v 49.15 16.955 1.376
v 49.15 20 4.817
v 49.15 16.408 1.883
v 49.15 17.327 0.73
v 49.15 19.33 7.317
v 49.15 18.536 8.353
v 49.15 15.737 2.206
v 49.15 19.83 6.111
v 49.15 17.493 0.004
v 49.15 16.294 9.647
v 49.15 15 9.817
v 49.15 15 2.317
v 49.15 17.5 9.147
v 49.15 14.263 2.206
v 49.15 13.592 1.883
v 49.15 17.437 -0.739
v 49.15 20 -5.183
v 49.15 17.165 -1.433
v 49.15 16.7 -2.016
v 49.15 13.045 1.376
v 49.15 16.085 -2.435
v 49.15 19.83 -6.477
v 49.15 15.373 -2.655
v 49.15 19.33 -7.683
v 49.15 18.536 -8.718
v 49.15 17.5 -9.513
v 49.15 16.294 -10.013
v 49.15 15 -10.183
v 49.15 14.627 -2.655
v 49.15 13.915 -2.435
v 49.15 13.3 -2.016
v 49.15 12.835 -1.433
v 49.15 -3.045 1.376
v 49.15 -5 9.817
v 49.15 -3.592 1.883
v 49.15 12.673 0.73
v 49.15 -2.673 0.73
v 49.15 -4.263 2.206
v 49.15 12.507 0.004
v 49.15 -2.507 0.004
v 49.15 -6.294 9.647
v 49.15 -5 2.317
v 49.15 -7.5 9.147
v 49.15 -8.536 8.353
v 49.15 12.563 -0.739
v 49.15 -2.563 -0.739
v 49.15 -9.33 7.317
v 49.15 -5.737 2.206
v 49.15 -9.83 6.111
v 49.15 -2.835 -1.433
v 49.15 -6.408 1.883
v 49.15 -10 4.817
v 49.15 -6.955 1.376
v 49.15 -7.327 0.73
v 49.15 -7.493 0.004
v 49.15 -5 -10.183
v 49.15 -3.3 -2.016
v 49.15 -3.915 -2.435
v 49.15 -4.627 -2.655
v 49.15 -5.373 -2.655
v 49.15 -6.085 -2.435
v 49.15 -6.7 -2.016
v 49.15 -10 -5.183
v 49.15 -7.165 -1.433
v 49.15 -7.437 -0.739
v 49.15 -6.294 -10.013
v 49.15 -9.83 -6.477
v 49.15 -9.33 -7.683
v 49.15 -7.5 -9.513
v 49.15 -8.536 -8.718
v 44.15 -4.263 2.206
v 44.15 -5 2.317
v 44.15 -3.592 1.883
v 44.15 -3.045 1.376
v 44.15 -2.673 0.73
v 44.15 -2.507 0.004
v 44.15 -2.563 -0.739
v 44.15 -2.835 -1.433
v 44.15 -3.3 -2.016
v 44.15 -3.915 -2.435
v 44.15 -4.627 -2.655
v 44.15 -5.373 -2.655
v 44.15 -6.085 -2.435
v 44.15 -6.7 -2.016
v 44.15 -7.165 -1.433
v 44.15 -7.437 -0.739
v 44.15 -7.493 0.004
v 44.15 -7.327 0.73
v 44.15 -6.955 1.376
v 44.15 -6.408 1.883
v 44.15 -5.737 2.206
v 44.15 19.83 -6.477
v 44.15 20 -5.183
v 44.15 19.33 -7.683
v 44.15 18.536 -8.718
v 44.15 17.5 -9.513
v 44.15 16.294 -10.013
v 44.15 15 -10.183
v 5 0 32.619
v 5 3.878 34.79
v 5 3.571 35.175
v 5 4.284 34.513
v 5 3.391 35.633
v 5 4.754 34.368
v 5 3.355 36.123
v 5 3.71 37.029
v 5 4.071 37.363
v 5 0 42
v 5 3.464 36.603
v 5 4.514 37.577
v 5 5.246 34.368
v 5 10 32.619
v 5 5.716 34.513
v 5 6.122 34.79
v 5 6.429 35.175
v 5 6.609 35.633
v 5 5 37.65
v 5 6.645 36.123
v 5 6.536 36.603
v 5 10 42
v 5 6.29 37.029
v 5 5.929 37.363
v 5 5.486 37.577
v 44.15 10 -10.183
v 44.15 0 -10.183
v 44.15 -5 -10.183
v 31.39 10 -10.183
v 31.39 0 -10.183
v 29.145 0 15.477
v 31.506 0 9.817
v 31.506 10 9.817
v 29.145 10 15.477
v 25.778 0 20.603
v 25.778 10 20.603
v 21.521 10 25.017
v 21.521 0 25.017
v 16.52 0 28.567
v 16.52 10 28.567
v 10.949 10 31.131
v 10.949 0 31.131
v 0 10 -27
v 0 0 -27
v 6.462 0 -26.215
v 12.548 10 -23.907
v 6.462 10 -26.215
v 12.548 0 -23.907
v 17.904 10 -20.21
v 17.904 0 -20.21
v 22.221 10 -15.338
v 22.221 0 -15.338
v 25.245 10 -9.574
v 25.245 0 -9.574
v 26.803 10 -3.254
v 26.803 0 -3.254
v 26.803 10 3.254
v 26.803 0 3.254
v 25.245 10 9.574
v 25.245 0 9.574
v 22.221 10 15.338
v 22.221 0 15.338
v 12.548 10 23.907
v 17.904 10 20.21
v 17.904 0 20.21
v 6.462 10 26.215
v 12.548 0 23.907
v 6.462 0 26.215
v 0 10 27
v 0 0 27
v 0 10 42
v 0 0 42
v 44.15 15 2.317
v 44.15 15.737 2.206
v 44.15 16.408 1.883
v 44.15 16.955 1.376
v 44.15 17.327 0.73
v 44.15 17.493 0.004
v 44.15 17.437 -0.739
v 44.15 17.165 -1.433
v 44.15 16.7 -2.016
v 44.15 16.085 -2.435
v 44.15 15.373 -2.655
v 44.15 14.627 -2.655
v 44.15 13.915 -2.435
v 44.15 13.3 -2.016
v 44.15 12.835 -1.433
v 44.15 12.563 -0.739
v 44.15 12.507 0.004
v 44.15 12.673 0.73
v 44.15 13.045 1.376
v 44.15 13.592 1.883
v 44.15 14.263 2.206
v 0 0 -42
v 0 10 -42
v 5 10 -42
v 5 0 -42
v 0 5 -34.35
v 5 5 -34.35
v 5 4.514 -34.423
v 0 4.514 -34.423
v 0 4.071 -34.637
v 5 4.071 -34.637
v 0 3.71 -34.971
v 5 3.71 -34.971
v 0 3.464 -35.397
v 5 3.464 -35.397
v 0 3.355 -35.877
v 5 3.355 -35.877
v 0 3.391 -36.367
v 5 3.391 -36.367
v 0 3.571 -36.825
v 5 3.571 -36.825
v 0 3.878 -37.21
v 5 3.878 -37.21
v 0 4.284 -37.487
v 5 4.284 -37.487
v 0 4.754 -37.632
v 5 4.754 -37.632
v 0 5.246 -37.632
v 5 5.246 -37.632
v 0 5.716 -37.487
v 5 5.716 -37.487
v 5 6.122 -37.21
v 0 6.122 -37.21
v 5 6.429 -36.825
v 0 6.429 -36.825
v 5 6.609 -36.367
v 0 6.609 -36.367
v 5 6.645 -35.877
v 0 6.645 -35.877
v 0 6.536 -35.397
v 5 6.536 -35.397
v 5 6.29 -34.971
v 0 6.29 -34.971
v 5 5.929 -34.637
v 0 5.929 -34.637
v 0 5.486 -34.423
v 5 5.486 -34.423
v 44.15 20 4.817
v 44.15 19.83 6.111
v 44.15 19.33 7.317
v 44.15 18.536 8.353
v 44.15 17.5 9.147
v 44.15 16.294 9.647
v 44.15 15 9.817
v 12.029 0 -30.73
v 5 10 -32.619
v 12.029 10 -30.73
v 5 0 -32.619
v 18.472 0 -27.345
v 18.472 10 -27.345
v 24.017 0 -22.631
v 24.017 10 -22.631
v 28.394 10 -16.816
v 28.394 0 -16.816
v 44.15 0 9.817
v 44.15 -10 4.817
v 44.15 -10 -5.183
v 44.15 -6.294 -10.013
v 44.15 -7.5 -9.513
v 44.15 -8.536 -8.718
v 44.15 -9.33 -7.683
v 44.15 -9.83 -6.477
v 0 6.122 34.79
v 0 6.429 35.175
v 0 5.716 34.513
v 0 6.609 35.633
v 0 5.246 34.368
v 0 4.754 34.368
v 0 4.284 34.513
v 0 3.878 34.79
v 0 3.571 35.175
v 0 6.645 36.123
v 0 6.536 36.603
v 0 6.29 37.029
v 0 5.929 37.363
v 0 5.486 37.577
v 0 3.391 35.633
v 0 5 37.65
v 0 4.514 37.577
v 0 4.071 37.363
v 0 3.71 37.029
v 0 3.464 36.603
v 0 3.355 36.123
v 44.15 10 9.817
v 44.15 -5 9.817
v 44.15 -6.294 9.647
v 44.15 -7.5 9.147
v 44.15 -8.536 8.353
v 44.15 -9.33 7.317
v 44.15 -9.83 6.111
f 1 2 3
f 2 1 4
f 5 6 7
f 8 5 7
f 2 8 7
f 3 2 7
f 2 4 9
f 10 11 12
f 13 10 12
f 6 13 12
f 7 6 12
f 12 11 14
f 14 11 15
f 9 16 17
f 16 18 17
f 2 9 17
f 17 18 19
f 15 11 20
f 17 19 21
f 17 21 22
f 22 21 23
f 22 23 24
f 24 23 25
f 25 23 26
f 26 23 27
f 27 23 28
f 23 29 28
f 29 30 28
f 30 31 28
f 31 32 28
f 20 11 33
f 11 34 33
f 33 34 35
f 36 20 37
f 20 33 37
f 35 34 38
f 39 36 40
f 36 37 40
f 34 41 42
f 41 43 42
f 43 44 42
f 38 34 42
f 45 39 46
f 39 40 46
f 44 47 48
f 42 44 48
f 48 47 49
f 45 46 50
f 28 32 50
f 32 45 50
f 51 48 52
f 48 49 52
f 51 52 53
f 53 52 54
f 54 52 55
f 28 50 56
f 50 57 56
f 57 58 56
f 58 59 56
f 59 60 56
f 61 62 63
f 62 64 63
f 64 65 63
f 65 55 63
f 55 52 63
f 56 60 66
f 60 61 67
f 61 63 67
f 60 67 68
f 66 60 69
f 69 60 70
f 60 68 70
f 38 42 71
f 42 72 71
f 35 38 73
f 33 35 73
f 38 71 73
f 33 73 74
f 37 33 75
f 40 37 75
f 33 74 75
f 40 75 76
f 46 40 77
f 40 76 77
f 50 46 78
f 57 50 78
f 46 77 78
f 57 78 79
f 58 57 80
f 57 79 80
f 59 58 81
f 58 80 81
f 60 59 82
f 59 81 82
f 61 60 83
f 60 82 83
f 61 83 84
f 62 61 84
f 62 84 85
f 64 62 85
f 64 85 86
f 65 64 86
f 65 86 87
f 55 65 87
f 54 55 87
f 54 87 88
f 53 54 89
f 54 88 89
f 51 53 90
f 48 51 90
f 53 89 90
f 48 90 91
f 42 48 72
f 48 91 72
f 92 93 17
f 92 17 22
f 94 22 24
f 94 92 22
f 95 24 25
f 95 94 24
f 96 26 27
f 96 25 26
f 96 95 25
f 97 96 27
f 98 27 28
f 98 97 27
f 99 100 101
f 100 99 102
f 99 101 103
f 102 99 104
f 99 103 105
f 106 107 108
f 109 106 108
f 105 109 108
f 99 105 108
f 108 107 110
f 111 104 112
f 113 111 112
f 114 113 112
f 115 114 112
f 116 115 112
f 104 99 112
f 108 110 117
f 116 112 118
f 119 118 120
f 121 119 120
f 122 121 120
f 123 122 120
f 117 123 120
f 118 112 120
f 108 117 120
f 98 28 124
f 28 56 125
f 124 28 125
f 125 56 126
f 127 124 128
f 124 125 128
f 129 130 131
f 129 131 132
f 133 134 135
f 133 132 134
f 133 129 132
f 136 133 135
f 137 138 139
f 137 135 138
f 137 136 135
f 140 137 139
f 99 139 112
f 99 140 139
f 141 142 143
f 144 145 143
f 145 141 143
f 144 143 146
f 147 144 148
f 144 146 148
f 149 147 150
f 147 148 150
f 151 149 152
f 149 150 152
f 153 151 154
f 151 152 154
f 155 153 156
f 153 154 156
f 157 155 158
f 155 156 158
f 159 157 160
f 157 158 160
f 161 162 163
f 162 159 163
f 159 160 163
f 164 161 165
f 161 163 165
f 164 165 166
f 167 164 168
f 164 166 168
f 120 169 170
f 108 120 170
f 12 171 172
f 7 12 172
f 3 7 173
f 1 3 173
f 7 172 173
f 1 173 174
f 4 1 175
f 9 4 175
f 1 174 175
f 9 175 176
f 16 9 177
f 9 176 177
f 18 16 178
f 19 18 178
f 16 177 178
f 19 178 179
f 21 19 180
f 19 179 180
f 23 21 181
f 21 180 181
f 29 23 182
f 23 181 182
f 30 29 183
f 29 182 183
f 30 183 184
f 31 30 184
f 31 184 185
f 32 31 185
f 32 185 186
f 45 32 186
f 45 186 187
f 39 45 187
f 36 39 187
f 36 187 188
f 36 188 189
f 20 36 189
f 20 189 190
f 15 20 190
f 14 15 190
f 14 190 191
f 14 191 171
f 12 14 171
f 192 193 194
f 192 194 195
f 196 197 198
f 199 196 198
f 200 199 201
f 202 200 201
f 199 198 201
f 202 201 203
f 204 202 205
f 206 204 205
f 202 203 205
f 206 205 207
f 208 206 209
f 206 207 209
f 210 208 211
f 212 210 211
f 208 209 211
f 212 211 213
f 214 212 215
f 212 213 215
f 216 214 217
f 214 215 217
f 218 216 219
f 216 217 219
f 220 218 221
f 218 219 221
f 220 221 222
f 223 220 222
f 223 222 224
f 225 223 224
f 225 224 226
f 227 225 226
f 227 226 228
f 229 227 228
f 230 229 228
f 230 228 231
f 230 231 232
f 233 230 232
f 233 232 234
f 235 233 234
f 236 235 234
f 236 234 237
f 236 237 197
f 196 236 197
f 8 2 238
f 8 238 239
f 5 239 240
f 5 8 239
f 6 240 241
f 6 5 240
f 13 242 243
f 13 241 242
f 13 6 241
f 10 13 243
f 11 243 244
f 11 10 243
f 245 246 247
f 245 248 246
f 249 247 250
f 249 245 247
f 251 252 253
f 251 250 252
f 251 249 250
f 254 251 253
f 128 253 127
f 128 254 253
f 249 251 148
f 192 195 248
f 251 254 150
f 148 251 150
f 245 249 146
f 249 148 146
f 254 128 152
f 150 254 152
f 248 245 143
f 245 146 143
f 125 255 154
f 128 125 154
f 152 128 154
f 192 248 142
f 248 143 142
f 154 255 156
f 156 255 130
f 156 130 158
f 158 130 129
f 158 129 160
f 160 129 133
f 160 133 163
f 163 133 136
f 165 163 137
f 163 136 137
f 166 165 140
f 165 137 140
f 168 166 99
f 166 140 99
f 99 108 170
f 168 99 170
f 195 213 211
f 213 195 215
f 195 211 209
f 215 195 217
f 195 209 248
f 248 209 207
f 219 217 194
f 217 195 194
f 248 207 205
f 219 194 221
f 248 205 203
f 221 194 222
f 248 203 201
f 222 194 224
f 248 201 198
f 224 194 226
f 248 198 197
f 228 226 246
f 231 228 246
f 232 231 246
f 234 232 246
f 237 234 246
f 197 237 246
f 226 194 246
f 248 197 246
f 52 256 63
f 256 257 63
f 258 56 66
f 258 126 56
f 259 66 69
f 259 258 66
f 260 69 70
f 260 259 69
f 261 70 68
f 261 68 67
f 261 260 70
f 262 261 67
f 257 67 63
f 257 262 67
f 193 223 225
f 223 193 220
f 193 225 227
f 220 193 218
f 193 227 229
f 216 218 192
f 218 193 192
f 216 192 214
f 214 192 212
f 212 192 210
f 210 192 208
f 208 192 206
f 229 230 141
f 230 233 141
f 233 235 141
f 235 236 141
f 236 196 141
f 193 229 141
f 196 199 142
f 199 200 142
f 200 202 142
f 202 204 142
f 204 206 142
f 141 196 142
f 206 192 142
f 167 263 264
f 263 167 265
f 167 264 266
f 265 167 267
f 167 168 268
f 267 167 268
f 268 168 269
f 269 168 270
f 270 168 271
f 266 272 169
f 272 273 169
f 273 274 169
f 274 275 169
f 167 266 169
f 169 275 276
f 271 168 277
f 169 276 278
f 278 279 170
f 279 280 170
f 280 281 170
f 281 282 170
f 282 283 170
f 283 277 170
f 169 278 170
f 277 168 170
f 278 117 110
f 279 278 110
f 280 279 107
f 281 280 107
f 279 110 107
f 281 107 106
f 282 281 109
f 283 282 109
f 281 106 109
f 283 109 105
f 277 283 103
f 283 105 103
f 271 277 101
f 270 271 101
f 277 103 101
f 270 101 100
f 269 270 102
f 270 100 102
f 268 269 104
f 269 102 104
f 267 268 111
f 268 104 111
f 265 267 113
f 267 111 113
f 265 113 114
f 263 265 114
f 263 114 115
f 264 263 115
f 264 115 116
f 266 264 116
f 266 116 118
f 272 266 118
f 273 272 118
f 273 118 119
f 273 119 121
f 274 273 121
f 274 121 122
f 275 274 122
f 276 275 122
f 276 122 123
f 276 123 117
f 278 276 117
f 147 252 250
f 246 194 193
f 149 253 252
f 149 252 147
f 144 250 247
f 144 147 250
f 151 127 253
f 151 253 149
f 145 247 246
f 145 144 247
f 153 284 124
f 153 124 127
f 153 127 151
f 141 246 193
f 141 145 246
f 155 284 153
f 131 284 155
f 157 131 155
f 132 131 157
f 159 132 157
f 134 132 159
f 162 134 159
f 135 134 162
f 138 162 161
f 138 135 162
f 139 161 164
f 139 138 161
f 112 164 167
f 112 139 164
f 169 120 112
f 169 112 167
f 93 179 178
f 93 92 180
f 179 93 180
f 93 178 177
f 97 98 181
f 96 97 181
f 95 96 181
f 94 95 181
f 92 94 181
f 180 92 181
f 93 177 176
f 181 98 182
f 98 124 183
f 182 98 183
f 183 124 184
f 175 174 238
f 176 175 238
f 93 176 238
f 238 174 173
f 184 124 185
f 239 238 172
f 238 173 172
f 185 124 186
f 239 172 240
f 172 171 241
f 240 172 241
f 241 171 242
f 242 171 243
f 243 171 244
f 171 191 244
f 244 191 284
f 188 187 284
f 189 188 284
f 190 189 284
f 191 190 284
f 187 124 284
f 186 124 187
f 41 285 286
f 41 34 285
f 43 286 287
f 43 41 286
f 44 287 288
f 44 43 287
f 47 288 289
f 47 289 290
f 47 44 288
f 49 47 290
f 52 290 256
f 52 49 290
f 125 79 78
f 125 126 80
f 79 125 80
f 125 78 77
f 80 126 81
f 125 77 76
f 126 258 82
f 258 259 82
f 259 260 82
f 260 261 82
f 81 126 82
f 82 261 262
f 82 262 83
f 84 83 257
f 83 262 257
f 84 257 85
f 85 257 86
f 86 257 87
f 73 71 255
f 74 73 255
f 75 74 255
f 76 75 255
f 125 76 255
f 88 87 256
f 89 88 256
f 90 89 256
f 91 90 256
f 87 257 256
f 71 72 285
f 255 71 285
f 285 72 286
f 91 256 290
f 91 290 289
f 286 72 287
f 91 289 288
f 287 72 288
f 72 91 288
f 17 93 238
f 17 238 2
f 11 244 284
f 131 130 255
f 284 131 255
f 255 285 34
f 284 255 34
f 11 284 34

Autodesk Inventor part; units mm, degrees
ref_plane "YZ Plane" through (0, 0, 0) normal (1, 0, 0) x (0, 1, 0)
ref_plane "XZ Plane" through (0, 0, 0) normal (0, 1, 0) x (-1, 0, 0)
ref_plane "XY Plane" through (0, 0, 0) normal (0, 0, 1) x (1, 0, 0)
sketch "Sketch1" plane through (0, 0, 0) normal (0, 1, 0) x (-1, 0, 0)
  arc A0 (0, 27) -> (0, -27) centre (0, 0) ccw
  line L0 (-49.15, 9.8171) -> (-49.15, -10.1829)
  line L1 (-49.15, -10.1829) -> (-31.3896, -10.1829)
  line L2 (-31.5059, 9.8171) -> (-49.15, 9.8171)
  arc A1 (0, 33) -> (-31.5059, 9.8171) centre (0, 0) ccw
  arc A2 (-31.3896, -10.1829) -> (0, -33) centre (0, 0) ccw
  line L3 (0, -33) -> (0, -27)
  line L4 (0, 27) -> (0, 33)
  point P0 (-41.2646, -10.1829)
  point P1 (-41.2646, 9.8171)
  point P2 (27.2866, 9.8171)
  point P3 (26.6483, -10.1829)
  dimension "d0" = 54
  dimension "d33" = 49.15
  dimension "d36" = 20
  dimension "d41" = 33
  dimension "d42" = 33
extrude "Extrusion1" add sketch "Sketch1" along normal blind 10
sketch "Sketch4" plane through (0, 10, 0) normal (0, 1, 0) x (1, 0, 0)
  line L0 (44.15, -9.8171) -> (49.15, -9.8171)
  line L1 (49.15, -9.8171) -> (49.15, 10.1829)
  line L2 (49.15, 10.1829) -> (44.15, 10.1829)
  line L3 (44.15, 10.1829) -> (44.15, -9.8171)
  line L4 (49.15, -9.8171) -> (49.15, 10.1829) projected
  line L5 (49.15, 10.1829) -> (31.3896, 10.1829) projected
  line L6 (31.5059, -9.8171) -> (49.15, -9.8171) projected
  point P0 (0, 0)
  dimension "d16" = 5
extrude "Extrusion3" add sketch "Sketch4" along normal blind 10 and the other way blind 20
sketch "Sketch5" plane through (44.15, 10, -10.1829) normal (-1, 0, 0) x (0, 0, 1)
  circle A0 centre (10, -15) radius 2.5
  circle A1 centre (10, 5) radius 2.5
  line L0 (20, -20) -> (0, -20) projected
  line L1 (0, 10) -> (20, 10) projected
  line L2 (0, 0) -> (0, 10) projected
  line L3 (0, -20) -> (0, -10) projected
  point P0 (10.1829, -10)
  dimension "d21" = 5
  dimension "d22" = 5
  dimension "d23" = 5
  dimension "d24" = 5
  dimension "d25" = 10
  dimension "d26" = 10
extrude "Extrusion4" cut sketch "Sketch5" against normal blind 10
fillet "Fillet2" radius 5 4 edges at (46.65, -10, 9.8171) (46.65, -10, -10.1829) (46.65, 20, 9.8171) (46.65, 20, -10.1829)
sketch "Sketch7" plane through (0, 0, -33) normal (-1, 0, 0) x (0, 0, 1)
  line L0 (6, 0) -> (6, 10) projected
  line L1 (6, 10) -> (-9, 10)
  line L2 (-9, 10) -> (-9, 0)
  line L3 (-9, 0) -> (6, 0)
  line L4 (6, 0) -> (6, 10)
  line L5 (6, 10) -> (60, 10) projected
  line L6 (60, 10) -> (75, 10)
  line L7 (75, 10) -> (75, 0)
  line L8 (75, 0) -> (60, 0)
  line L9 (60, 0) -> (60, 10)
  point P0 (33, 0)
  dimension "d43" = 15
extrude "Extrusion6" add sketch "Sketch7" against normal blind 5
sketch "Sketch8" plane through (5, 0, -33) normal (1, 0, 0) x (0, 0, 1)
  circle A0 centre (-3, -5) radius 1.65
  circle A1 centre (69, -5) radius 1.65
  line L0 (-9, 0) -> (-9, -10) projected
  line L1 (75, -10) -> (75, 0) projected
  line L2 (65.619, -10) -> (75, -10) projected
  line L3 (-9, -10) -> (0.381, -10) projected
  point P0 (33, 0)
  point P1 (-9, 10)
  point P2 (75, 10)
  point P3 (60, 10)
  point P4 (6, 10)
  dimension "d46" = 6
  dimension "d47" = 6
  dimension "d50" = 3.3
  dimension "d53" = 5
  dimension "d54" = 5
extrude "Extrusion7" cut sketch "Sketch8" against normal blind 5
equation "\"BendRadius\" = Thickness"
equation "\"BendReliefWidth\" = Thickness"
equation "\"BendReliefDepth\" = 0.5 * Thickness"
equation "\"CornerReliefSize\" = 4 * Thickness"
equation "\"MinimumRemnant\" = 2 * Thickness"
equation "\"TransitionRadius\" = BendRadius"
equation "\"JacobiRadiusSize\" = BendRadius"
equation "\"GapSize\" = Thickness"
equation "\"Thickness\" = 0.5"
properties part number "22010_Tube End Support_V1" material "ABS Plastic"
